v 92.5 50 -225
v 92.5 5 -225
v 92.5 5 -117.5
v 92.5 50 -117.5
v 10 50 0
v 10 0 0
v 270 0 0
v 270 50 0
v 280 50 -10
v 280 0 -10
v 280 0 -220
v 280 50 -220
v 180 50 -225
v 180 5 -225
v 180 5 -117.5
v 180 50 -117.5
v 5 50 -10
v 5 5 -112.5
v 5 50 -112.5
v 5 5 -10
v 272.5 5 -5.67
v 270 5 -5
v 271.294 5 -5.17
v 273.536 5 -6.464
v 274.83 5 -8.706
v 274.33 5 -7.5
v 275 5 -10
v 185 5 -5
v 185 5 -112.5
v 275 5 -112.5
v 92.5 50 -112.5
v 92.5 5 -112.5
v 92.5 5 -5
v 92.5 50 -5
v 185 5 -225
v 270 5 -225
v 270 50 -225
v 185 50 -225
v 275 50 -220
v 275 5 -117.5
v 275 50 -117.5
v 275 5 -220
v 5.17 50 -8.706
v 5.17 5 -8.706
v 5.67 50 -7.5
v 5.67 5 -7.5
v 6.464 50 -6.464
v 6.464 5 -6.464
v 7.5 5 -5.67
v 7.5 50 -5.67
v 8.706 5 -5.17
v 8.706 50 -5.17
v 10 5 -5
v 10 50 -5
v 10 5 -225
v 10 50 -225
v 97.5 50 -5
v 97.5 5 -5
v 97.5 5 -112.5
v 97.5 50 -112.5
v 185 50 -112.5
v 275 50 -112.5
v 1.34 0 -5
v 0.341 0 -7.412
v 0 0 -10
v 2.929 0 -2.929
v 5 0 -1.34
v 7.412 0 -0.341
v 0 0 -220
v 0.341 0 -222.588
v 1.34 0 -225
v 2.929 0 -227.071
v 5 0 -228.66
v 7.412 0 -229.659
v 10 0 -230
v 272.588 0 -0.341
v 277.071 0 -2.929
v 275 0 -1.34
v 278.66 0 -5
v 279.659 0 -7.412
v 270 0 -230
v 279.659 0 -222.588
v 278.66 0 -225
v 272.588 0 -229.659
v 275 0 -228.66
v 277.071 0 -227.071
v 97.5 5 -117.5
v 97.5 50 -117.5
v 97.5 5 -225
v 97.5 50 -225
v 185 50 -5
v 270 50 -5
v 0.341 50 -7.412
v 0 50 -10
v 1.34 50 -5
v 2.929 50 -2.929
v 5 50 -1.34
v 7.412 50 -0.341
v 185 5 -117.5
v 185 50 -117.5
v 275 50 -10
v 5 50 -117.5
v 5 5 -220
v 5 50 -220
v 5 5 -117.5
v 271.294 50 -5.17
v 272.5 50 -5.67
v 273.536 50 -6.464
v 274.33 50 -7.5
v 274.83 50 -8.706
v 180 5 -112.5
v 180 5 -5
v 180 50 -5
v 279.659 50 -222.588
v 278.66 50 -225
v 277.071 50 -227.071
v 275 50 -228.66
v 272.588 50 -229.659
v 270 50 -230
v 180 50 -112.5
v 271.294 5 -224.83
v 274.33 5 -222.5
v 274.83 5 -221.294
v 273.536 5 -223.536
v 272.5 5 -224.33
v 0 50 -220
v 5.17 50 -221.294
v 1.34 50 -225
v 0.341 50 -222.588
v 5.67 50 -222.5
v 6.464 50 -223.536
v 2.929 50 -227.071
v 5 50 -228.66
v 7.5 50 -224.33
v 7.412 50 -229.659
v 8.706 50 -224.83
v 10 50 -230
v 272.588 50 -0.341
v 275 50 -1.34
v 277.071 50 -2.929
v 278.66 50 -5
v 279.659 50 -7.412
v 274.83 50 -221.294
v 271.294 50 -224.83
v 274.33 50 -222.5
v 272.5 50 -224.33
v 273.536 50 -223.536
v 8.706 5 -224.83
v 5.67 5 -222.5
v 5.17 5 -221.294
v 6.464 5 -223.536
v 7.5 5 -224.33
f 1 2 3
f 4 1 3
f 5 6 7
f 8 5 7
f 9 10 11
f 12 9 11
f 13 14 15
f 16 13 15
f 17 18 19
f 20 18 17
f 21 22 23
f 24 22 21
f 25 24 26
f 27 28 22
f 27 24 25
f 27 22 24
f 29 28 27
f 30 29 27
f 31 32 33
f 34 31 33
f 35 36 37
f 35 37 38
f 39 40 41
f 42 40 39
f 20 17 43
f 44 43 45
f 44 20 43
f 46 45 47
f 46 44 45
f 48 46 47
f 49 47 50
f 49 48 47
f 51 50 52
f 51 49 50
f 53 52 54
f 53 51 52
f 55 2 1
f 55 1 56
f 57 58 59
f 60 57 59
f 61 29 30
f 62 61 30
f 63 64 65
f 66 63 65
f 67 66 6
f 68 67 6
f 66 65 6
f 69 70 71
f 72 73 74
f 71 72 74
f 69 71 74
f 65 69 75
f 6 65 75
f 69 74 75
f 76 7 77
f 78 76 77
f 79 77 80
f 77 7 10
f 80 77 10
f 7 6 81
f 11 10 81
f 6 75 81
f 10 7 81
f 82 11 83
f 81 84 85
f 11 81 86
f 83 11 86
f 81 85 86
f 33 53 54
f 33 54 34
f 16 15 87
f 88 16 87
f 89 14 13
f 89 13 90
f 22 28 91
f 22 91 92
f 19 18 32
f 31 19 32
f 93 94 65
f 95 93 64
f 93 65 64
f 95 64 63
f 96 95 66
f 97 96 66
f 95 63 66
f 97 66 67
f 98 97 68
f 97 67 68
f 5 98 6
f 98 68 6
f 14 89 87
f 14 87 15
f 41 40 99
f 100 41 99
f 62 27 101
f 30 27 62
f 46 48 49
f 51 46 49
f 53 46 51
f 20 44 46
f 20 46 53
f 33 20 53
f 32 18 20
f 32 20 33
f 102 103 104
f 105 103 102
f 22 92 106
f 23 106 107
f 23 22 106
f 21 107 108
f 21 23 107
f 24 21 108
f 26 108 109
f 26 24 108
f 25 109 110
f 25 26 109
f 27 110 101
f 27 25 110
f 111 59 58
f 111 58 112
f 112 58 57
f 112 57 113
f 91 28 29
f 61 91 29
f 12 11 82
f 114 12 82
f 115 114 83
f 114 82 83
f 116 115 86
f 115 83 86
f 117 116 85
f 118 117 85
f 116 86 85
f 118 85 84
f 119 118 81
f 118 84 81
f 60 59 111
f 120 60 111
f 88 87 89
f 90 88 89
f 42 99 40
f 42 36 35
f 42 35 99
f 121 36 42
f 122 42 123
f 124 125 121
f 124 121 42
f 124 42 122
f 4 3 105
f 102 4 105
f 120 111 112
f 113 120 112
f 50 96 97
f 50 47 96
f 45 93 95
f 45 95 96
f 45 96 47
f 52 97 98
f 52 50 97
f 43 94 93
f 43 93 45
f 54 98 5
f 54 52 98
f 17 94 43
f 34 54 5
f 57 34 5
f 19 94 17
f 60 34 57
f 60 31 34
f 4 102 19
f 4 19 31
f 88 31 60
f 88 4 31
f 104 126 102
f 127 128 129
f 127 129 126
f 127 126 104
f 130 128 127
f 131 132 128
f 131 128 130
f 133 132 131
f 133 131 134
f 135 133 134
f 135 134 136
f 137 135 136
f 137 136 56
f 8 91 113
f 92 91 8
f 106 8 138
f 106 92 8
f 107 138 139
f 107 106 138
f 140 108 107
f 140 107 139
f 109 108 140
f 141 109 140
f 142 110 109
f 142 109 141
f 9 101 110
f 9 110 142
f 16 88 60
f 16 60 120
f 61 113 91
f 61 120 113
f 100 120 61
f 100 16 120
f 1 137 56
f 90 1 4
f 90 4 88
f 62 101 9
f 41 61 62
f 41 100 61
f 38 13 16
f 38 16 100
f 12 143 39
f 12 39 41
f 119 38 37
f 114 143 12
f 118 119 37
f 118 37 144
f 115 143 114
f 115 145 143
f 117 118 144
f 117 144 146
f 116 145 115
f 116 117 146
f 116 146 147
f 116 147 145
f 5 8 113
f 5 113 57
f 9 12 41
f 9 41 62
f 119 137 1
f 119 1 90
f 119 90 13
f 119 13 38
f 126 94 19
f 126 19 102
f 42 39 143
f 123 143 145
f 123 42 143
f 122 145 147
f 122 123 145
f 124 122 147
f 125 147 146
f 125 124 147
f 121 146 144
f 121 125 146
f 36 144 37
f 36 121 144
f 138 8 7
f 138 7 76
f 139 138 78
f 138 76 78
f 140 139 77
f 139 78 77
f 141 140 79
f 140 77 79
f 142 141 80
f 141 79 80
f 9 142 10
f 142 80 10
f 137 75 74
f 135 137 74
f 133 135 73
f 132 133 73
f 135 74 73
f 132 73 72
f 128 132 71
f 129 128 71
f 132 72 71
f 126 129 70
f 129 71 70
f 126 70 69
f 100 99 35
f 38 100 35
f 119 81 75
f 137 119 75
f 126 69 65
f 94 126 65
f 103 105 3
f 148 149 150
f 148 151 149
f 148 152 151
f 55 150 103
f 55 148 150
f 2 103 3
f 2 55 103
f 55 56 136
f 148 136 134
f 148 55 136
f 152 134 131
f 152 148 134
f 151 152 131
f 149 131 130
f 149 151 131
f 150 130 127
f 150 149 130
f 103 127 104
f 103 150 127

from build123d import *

# Parameters (mm, degrees)
EXTRUDE_1_DEPTH = 50
SHELL_1_T       = -5
EXTRUDE_3_DEPTH = 45


with BuildPart() as part:
    # 스케치1 → 보스-돌출1 (new body)
    with BuildSketch(Plane(origin=(0, 0, 0), x_dir=(1, 0, 0), z_dir=(0, 1, 0))):
        with BuildLine():
            Line((10, 0), (270, 0))
            ThreePointArc((270, 0), (277.071067812, 2.928932188), (280, 10))
            Line((280, 10), (280, 220))
            ThreePointArc((280, 220), (277.071067812, 227.071067812), (270, 230))
            Line((270, 230), (10, 230))
            ThreePointArc((10, 230), (2.928932188, 227.071067812), (0, 220))
            Line((0, 220), (0, 10))
            ThreePointArc((0, 10), (2.928932188, 2.928932188), (10, 0))
        make_face()
    extrude(amount=EXTRUDE_1_DEPTH)

    # 쉘1
    shell_1_openings = [part.faces().sort_by_distance(p)[0] for p in [
        (140, 50, -115),
    ]]
    offset(amount=SHELL_1_T, openings=shell_1_openings, kind=Kind.INTERSECTION)

    # 스케치4 → 보스-돌출3 (add)
    with BuildSketch(Plane(origin=(0, 5, 0), x_dir=(1, 0, 0), z_dir=(0, 1, 0))):
        Polygon((5, 117.5), (5, 112.5), (92.5, 112.5), (92.5, 5), (97.5, 5), (97.5, 112.5), (180, 112.5), (180, 5), (185, 5), (185, 112.5), (275, 112.5), (275, 117.5), (185, 117.5), (185, 225), (180, 225), (180, 117.5), (97.5, 117.5), (97.5, 225), (92.5, 225), (92.5, 117.5), align=None)
    extrude(amount=EXTRUDE_3_DEPTH)


solid = part.part
